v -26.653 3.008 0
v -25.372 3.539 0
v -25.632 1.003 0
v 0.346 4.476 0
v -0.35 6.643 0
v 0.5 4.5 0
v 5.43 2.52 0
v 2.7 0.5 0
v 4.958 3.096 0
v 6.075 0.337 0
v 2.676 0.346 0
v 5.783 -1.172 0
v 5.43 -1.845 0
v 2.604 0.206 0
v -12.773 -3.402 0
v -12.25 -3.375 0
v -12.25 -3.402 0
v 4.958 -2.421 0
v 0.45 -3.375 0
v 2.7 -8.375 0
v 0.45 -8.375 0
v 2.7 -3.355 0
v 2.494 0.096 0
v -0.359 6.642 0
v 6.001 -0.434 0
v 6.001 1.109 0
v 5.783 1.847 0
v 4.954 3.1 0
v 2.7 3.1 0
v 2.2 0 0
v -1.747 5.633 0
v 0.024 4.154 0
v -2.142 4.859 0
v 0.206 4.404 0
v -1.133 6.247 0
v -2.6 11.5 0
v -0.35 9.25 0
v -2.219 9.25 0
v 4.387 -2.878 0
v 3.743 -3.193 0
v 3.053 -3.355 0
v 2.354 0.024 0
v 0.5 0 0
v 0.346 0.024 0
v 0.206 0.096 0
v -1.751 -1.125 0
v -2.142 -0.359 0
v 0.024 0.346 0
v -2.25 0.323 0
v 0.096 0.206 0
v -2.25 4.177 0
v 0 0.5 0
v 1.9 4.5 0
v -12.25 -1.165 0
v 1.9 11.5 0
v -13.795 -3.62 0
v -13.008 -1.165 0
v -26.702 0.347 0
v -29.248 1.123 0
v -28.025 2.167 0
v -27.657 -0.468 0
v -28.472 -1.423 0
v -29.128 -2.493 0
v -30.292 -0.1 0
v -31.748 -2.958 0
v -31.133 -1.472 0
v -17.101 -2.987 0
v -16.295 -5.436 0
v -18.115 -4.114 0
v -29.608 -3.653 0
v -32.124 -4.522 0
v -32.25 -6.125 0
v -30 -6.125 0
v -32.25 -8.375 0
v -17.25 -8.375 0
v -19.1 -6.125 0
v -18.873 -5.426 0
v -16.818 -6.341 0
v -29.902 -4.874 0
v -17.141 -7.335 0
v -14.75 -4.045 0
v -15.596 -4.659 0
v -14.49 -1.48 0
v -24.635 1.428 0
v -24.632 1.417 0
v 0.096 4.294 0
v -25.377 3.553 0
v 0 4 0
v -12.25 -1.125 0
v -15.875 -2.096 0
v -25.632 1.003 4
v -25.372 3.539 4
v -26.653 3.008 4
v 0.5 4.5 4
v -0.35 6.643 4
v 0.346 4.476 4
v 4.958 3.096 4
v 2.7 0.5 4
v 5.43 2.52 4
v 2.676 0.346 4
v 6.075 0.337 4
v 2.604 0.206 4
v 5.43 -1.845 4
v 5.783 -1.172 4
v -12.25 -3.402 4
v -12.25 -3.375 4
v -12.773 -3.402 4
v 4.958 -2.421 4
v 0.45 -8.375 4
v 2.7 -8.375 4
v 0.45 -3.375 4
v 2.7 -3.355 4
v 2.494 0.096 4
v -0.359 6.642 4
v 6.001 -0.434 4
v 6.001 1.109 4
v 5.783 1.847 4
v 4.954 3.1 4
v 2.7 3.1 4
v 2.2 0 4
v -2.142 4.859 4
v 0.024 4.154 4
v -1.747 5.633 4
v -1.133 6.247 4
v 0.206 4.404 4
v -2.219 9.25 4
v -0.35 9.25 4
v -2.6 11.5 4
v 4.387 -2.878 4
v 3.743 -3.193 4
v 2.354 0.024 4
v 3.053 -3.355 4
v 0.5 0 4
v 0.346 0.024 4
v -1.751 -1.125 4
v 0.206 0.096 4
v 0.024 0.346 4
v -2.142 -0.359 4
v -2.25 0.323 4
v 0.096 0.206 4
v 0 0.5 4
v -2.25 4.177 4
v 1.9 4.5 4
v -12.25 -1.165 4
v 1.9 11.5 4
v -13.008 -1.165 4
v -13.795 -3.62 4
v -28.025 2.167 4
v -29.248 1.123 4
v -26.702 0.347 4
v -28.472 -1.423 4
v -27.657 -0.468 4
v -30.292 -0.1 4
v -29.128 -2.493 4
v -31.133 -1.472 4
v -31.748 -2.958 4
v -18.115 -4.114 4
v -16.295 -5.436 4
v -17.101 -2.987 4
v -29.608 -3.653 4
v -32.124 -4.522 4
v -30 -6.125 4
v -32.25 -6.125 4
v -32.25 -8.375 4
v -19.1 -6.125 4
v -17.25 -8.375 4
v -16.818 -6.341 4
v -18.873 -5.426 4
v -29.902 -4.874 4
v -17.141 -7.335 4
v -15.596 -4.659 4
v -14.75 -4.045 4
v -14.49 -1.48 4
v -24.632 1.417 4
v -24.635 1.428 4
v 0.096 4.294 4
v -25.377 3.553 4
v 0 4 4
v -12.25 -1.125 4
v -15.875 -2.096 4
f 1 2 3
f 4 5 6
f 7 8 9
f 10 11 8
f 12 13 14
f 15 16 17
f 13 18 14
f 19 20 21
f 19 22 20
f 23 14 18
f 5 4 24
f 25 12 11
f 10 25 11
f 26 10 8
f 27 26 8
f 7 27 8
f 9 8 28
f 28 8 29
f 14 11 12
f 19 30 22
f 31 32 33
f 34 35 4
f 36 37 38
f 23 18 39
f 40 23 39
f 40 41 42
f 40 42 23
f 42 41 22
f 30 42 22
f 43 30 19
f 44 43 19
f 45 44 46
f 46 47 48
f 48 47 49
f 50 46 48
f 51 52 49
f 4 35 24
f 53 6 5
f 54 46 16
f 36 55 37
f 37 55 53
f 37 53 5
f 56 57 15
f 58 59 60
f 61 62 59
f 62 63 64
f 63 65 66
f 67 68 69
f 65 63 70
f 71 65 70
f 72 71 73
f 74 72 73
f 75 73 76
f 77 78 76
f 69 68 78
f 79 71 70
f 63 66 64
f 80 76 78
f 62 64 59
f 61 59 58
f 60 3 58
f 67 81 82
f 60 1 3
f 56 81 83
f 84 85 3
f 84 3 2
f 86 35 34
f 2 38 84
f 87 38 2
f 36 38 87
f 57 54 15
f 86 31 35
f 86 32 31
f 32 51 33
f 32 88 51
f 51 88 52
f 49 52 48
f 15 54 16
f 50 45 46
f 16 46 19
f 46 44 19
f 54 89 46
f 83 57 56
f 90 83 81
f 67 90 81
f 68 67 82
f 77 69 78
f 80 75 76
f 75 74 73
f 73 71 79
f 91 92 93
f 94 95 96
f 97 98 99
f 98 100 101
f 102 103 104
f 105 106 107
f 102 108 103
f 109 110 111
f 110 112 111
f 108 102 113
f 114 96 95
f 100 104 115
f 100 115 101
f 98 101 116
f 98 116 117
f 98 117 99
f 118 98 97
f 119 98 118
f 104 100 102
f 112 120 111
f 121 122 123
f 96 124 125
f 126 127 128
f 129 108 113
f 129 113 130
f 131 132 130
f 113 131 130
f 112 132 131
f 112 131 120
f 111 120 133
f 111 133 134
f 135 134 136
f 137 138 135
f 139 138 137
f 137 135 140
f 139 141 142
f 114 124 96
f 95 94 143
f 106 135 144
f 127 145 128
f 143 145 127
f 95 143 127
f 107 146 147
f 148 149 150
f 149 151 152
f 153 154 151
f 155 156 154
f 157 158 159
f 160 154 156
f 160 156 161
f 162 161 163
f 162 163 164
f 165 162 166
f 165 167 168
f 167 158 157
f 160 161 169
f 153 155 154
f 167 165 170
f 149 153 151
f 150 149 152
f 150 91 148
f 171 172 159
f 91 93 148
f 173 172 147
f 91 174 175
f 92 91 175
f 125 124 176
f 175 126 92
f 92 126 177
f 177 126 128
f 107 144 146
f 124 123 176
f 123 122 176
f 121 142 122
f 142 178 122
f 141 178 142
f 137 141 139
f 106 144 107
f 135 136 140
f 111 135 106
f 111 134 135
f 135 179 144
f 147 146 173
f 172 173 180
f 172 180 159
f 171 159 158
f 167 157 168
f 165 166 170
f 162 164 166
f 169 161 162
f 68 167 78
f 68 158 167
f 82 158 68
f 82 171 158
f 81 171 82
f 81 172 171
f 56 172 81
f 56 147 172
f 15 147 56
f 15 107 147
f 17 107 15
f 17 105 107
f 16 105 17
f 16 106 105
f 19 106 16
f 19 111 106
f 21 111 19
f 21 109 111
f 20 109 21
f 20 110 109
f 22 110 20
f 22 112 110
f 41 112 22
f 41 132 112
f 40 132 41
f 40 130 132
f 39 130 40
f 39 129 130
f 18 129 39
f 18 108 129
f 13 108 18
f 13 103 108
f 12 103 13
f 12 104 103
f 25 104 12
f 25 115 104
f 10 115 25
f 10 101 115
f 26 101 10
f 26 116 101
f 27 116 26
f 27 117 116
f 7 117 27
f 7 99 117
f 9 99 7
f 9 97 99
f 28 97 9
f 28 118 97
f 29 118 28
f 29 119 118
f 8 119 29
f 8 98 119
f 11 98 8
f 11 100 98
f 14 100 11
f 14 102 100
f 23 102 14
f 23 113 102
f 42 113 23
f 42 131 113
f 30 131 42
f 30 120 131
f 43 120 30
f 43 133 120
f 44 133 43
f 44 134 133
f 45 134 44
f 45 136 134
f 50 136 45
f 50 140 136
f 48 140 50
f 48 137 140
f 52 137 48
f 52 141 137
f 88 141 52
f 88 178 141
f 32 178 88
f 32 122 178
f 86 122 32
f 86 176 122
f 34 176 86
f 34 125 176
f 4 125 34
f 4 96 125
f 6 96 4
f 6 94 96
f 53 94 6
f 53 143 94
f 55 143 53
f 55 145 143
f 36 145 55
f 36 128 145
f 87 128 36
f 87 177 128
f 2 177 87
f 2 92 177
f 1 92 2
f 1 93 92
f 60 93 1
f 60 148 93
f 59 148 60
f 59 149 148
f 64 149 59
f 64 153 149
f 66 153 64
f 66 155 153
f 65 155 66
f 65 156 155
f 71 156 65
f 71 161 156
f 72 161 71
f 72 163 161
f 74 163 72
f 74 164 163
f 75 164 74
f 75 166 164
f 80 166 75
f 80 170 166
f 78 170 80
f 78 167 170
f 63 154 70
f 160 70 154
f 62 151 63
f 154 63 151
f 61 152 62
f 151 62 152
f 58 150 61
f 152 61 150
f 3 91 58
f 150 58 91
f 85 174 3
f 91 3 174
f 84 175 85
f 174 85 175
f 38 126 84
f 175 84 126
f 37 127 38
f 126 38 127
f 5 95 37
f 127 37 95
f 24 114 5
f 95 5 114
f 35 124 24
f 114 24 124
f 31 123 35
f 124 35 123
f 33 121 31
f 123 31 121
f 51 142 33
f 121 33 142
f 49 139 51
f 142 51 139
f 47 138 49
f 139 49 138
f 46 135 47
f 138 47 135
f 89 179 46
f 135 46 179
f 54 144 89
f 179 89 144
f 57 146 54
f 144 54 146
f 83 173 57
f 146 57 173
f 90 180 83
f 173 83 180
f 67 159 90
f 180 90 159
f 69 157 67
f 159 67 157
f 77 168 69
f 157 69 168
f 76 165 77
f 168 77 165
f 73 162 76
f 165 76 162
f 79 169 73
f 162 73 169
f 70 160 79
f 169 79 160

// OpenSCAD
// pot_holder.scad
// By Gregg Christopher, 2015. 
// This file is public domain. Use at your own risk.


/* [Canister Bottom Edge Dimensions] */
// Height of the rolled metal portion (Rolled metal bottom of canister) Defaults are for a typical large 230g-ish canister.
edge_height = 4.5; // [0.5:0.1:15.0]
// Width (thickness) of the rolled metal portion
edge_width = 2.7; // [0.5:0.1:10.0]
// Radius to bevel the inside of the clip portion of the canister foot. Probably just cosmetic. 
edge_bevel_radius = 0.5; // [0.01:0.05:2.0]
// Thickness of the thinner metal portion above the rolled edge. Decrease to enlarge the portion of the foot pressing against the canister, if the foot tends to tilt up.
metal_thickness = .8; // [0.1:0.05:3.0]

/* [Holder Foot Dimensions] */
// Option to include a small support directly below the canister; might make it harder to break when set on a flat surface with a heavy load.
include_support_peg = "Include_Support_Peg"; // [No_Support_Peg, Include_Support_Peg]
// Width of the entire support. (Viewed from above as it sticks out from the canister.)
foot_width = 4; // [1.0:0.1:10.0]
// Thickness of the support structure.
foot_thickness = 2.25; // [0.5:0.1:10.0]
// Length of the bottom of the support leg, before it curves down to the ground.
foot_inner_length = 10; // [3.0:0.1:40.0]
// Height of the support leg, nominally how high it will hold the canister up. (Since these are plastic, a large value here is probably unwise.)
foot_lower_height = 5; // [0.1:0.1:20.0]
// Length of the portion of the leg that makes contact with the ground.
foot_base_length = 15; // [3.0:0.1:40.0]
// Height of the vertical section that makes contact with the side of the canister. 
cannister_contact_segment_height = 7; // [2.0:0.1:20.0]
// Height of the flange that grabs the inside bottom of the canister.
inner_flange_height = 3.1; // [0.5:0.1:10.0]
// Radius of the rounded portion on the outside of the upper leg of the support.
outer_leg_bevel_radius = 8; // [1.0:0.1:20.0]

/* [Hidden] */
// Calculate the angle at which the tangent line of the outer foot circle hits the rectangular top upper portion of he leg.

// Distance between the origin of the circle and the top corner of the leg

target_x_distance = (edge_width - 2*foot_thickness - metal_thickness) - (-foot_base_length - foot_inner_length - foot_lower_height + outer_leg_bevel_radius);
target_y_distance = (edge_height + cannister_contact_segment_height) - (-foot_lower_height - foot_thickness*0.5);
distance = sqrt(target_x_distance*target_x_distance + target_y_distance*target_y_distance);

// Radius of the outer foot circle portion
radius = outer_leg_bevel_radius + foot_thickness;

// Angle between the center point and the target point
otherangle = atan(target_y_distance/target_x_distance);

// Angle at which the line tangent to the circle intersects the target point
tangent_angle = acos(radius/distance) + otherangle - 90;

// Calculate the length of the upper leg segment, given all the above measurements.
tangent_point_x = -radius * sin(tangent_angle); 
tangent_point_y = radius * cos(tangent_angle); 

top_segment_x_distance = target_x_distance - tangent_point_x;
top_segment_y_distance = target_y_distance - tangent_point_y;

top_segment_length = sqrt(top_segment_x_distance * top_segment_x_distance + top_segment_y_distance * top_segment_y_distance);

module edge_outline() {
  translate([edge_bevel_radius, edge_bevel_radius])
  minkowski() {
    square([edge_width - 2*edge_bevel_radius, edge_height - 2*edge_bevel_radius]);
    circle(r = edge_bevel_radius, $fn = 20);
  }
}

linear_extrude(height = foot_width) {
  union() {
    // The main outline of the cannister clip
    difference() {
      union() {
        offset(delta = foot_thickness) edge_outline();
        // Extra material to reinforce the pot holder clip. (The weakest part of the structure.)
        translate([edge_width, foot_thickness*1.5*.1])
        scale([1, 1.1])
        intersection() {
          circle(r = foot_thickness*1.5, $fn = 30);
          //translate([0, -foot_thickness*1.5]) square([foot_thickness*1.5, foot_thickness*1.5]);
          translate([0, -foot_thickness*1.5]) 
          square([foot_thickness*1.5, foot_thickness*3.0]);
        }
      }

      edge_outline();
      //translate([edge_width - metal_thickness, edge_height - edge_bevel_radius])
      //square([metal_thickness, foot_thickness + edge_bevel_radius]);
      //translate([edge_width - metal_thickness, foot_thickness*1.0])
      translate([edge_width - metal_thickness, inner_flange_height])
      square([metal_thickness + foot_thickness*2, foot_thickness + edge_bevel_radius + edge_height - edge_bevel_radius - foot_thickness*1.0 + inner_flange_height]);
    }
    
    
    /* 
    // Full length thicker flange
    //translate([edge_width, 0])
    // square([foot_thickness*1.5, edge_height/2 - foot_thickness/2]); 

    translate([edge_width, edge_height - foot_thickness/2])
    %intersection() {
      circle(r = foot_thickness*1.5, $fn = 30);
      square([foot_thickness*1.5, foot_thickness*1.5]);
    }
    */
    
    // Inner segment holding the side of the cannister
    translate([edge_width - foot_thickness - metal_thickness, edge_height])
    square([foot_thickness, cannister_contact_segment_height]);

    translate([edge_width - 2*foot_thickness - metal_thickness, edge_height + cannister_contact_segment_height - foot_thickness])
    square([foot_thickness*2, foot_thickness]);
    
    // Optional support peg directly below the canister
    if(include_support_peg == "Include_Support_Peg") {
      translate([edge_width - foot_thickness, -foot_lower_height - foot_thickness*1.5])
      square([foot_thickness, foot_lower_height]);
    }

    // Main segment of bottom leg extension
    translate([-foot_inner_length - foot_thickness, -foot_thickness*1.5])
    square([foot_inner_length + foot_thickness + edge_width, foot_thickness]);
    
    // The curved portion of the lower leg extension
    translate([-foot_inner_length - foot_thickness, -foot_lower_height - foot_thickness*1.5])
    intersection() {
      difference() {
        circle(r = foot_lower_height + foot_thickness, $fn = 30);
        circle(r = foot_lower_height, $fn = 30);
      }
      translate([-foot_lower_height - foot_thickness, 0])
      square([foot_lower_height + foot_thickness, foot_lower_height + foot_thickness]);
    }
    
    // The bottom segment that rests on the ground
    translate([-foot_base_length - foot_inner_length - foot_thickness - foot_lower_height, -foot_lower_height - foot_thickness*1.5])
    square([foot_base_length, foot_thickness]);
    
    // The annoyingly shaped top leg extension
    
    translate([-foot_base_length - foot_inner_length - foot_lower_height + outer_leg_bevel_radius, -foot_lower_height - foot_thickness*0.5])
    intersection() {
      difference() {
        circle(r = outer_leg_bevel_radius + foot_thickness, $fn = 40);
        circle(r = outer_leg_bevel_radius, $fn = 40);
      }
      rotate([0, 0, 90]) square([outer_leg_bevel_radius + foot_thickness, outer_leg_bevel_radius + foot_thickness]);
      rotate([0, 0, 90 + tangent_angle]) square([outer_leg_bevel_radius + foot_thickness, outer_leg_bevel_radius + foot_thickness]);
    }
    
    translate([-foot_base_length - foot_inner_length - foot_lower_height + outer_leg_bevel_radius, -foot_lower_height - foot_thickness*0.5])
    rotate([0, 0, tangent_angle])
    translate([0, outer_leg_bevel_radius])
    square([top_segment_length, foot_thickness]);

    //translate([edge_width - 2*foot_thickness - metal_thickness, edge_height + cannister_contact_segment_height - foot_thickness])
    //circle(r = 0.5);
    
  }
}
  
  
